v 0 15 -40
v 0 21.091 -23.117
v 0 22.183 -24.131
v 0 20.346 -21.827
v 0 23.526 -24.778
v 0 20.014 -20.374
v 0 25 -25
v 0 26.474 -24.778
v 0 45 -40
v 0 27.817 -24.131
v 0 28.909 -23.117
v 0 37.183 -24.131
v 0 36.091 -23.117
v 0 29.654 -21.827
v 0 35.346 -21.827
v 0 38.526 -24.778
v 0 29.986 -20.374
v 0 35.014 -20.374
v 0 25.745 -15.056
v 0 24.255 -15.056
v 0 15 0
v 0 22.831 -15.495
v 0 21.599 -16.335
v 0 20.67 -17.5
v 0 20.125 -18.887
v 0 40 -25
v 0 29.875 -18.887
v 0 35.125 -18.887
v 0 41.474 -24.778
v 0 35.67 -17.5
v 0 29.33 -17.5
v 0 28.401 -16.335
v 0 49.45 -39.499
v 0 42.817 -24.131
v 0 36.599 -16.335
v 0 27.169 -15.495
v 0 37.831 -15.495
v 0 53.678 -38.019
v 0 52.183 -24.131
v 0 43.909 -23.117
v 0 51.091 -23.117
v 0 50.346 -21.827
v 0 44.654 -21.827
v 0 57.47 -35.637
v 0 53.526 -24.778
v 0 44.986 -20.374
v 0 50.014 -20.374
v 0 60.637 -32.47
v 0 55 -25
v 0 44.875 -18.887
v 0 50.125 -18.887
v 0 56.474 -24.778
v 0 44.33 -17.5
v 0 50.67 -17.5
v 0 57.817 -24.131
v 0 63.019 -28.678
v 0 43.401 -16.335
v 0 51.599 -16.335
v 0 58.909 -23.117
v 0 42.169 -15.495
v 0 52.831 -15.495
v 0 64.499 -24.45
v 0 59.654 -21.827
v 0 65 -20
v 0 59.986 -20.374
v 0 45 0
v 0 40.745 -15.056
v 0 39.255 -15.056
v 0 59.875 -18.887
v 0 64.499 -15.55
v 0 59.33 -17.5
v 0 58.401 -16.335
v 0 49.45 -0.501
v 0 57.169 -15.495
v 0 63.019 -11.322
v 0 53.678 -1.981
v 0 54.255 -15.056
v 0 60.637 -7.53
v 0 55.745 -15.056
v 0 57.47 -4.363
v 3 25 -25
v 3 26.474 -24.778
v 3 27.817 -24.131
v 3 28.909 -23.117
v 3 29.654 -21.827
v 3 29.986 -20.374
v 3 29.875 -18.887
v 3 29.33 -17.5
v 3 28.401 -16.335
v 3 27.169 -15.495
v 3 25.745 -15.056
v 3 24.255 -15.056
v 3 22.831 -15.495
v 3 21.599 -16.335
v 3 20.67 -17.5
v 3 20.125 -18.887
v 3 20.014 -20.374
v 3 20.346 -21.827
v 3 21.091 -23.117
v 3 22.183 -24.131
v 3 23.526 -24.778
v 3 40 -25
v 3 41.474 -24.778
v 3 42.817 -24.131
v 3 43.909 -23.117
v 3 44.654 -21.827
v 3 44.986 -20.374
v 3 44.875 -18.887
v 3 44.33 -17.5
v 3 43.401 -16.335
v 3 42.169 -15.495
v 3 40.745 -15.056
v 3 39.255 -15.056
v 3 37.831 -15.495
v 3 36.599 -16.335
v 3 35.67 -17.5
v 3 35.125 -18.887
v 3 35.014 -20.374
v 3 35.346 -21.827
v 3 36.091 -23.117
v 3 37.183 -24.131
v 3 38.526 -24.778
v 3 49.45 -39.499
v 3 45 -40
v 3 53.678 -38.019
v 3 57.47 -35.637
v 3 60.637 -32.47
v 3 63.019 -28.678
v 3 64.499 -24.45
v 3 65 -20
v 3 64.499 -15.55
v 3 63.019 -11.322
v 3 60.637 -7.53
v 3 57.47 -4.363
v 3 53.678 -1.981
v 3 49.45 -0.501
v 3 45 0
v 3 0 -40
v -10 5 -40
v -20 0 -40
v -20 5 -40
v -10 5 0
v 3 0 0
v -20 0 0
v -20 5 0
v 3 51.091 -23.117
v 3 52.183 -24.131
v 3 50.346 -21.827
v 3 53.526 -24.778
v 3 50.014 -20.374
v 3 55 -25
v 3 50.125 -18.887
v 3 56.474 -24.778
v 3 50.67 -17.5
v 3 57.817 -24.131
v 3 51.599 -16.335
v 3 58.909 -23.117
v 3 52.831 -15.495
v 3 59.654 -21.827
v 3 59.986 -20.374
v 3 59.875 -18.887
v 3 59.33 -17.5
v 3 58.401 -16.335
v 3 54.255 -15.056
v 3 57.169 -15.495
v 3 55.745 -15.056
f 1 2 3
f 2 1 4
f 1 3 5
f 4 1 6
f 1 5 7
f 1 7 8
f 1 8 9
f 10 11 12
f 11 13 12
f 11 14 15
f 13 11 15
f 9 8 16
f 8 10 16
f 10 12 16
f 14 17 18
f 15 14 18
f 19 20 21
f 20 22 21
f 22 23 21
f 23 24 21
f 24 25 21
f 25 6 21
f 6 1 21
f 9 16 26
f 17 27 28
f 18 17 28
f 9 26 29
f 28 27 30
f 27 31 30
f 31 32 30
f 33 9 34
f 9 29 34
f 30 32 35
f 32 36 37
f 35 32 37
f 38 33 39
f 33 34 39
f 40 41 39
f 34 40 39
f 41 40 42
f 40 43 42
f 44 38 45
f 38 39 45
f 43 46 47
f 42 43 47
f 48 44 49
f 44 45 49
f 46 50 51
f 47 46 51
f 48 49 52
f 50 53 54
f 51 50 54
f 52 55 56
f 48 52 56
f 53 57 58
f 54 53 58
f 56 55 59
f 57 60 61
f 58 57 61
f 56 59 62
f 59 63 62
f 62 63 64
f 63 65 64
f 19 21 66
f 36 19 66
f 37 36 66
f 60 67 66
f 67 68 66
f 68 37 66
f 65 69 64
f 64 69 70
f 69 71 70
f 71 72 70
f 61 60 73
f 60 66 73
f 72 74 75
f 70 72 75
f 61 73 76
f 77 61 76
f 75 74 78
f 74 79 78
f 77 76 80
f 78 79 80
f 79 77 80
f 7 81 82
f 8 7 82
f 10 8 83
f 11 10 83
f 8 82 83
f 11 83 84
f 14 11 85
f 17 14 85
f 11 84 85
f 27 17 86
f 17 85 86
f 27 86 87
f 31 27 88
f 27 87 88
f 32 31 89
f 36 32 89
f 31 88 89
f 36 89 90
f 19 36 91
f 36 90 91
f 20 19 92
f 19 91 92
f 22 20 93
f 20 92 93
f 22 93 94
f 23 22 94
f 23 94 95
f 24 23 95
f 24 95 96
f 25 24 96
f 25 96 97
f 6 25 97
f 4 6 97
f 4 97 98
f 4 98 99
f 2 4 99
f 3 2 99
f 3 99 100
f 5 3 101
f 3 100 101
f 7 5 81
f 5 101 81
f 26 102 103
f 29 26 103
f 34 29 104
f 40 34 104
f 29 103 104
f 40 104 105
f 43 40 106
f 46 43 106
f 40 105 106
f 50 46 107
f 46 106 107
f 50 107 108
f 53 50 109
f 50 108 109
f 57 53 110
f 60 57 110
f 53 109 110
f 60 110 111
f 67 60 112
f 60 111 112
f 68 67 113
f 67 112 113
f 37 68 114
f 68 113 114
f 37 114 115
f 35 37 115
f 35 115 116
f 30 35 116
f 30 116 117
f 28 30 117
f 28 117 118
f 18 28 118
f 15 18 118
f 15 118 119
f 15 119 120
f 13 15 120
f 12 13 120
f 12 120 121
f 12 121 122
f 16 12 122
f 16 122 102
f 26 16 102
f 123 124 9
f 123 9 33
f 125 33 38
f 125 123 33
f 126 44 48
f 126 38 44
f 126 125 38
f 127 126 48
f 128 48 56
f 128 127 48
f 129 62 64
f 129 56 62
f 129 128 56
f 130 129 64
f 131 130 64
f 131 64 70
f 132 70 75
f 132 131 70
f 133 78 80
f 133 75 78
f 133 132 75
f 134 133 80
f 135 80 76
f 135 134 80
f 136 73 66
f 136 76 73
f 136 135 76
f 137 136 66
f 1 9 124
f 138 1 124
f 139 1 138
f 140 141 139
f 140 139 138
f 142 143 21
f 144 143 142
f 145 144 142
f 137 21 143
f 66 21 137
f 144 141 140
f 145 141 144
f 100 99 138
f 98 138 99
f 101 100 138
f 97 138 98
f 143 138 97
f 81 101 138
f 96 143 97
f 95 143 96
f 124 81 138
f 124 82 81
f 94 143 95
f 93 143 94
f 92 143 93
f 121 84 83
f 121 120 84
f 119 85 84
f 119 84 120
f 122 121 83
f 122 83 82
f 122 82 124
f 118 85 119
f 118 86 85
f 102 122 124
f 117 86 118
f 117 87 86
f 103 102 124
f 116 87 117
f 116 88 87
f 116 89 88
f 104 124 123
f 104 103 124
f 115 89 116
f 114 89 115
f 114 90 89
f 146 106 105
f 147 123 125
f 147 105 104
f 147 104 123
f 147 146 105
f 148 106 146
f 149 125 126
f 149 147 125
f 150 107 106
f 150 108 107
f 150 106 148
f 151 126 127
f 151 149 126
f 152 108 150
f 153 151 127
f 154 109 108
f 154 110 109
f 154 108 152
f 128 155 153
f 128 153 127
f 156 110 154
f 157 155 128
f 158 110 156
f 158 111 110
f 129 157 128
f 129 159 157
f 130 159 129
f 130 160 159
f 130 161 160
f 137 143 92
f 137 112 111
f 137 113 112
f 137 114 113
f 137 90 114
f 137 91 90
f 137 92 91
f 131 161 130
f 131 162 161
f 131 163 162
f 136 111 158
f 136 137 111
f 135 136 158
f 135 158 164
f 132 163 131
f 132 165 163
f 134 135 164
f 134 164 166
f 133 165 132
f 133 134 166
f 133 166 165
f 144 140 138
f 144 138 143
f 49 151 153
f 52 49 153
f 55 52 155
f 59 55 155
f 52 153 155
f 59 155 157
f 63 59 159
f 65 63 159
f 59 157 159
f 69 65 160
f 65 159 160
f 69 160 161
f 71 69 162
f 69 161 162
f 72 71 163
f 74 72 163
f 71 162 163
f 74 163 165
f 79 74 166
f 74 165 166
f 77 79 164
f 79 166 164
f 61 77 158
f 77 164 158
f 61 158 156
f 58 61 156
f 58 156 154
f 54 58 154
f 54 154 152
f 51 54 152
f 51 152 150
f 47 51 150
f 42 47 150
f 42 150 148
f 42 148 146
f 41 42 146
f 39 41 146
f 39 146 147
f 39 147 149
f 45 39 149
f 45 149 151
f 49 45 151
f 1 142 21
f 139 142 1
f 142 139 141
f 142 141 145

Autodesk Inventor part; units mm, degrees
ref_plane "YZ Plane" through (0, 0, 0) normal (1, 0, 0) x (0, 1, 0)
ref_plane "XZ Plane" through (0, 0, 0) normal (0, 1, 0) x (-1, 0, 0)
ref_plane "XY Plane" through (0, 0, 0) normal (0, 0, 1) x (1, 0, 0)
sketch "Sketch1" plane through (0, 0, 0) normal (1, 0, 0) x (0, 1, 0)
  line L0 (0, 0) -> (65, 0)
  line L1 (65, 0) -> (65, -40)
  line L2 (65, -40) -> (0, -40)
  line L3 (0, -40) -> (0, 0)
  dimension "d0" = 40
  dimension "d1" = 65
extrude "Extrusion1" add sketch "Sketch1" along normal blind 3
sketch "Sketch2" plane through (0, 0, 0) normal (-1, 0, 0) x (0, 0, 1)
  line L0 (0, 0) -> (-40, 0) projected
  line L1 (-40, 0) -> (-40, 65) projected
  line L2 (0, 0) -> (-40, 0)
  line L3 (-40, 0) -> (-40, 5)
  line L4 (-40, 5) -> (0, 5)
  line L5 (0, 5) -> (0, 0)
  dimension "d4" = 5
extrude "Extrusion2" add sketch "Sketch2" along normal blind 20
chamfer "Chamfer1" distance 10 angle 45 1 edges at (0, 5, -20)
sketch "Sketch3" plane through (3, 0, 0) normal (1, 0, 0) x (0, 0, -1)
  circle A0 centre (20, 55) radius 5
  circle A1 centre (20, 40) radius 5
  circle A2 centre (20, 25) radius 5
  line L0 (40, 65) -> (0, 65) projected
  point P0 (0, 0)
  dimension "d10" = 10
  dimension "d11" = 10
  dimension "d12" = 5
  dimension "d13" = 15
  dimension "d14" = 20
extrude "Extrusion3" cut sketch "Sketch3" against normal up to surface (3 mm away)
fillet "Fillet1" radius 20 2 edges at (1.5, 65, 0) (1.5, 65, -40)
properties part number "pot_stand"
